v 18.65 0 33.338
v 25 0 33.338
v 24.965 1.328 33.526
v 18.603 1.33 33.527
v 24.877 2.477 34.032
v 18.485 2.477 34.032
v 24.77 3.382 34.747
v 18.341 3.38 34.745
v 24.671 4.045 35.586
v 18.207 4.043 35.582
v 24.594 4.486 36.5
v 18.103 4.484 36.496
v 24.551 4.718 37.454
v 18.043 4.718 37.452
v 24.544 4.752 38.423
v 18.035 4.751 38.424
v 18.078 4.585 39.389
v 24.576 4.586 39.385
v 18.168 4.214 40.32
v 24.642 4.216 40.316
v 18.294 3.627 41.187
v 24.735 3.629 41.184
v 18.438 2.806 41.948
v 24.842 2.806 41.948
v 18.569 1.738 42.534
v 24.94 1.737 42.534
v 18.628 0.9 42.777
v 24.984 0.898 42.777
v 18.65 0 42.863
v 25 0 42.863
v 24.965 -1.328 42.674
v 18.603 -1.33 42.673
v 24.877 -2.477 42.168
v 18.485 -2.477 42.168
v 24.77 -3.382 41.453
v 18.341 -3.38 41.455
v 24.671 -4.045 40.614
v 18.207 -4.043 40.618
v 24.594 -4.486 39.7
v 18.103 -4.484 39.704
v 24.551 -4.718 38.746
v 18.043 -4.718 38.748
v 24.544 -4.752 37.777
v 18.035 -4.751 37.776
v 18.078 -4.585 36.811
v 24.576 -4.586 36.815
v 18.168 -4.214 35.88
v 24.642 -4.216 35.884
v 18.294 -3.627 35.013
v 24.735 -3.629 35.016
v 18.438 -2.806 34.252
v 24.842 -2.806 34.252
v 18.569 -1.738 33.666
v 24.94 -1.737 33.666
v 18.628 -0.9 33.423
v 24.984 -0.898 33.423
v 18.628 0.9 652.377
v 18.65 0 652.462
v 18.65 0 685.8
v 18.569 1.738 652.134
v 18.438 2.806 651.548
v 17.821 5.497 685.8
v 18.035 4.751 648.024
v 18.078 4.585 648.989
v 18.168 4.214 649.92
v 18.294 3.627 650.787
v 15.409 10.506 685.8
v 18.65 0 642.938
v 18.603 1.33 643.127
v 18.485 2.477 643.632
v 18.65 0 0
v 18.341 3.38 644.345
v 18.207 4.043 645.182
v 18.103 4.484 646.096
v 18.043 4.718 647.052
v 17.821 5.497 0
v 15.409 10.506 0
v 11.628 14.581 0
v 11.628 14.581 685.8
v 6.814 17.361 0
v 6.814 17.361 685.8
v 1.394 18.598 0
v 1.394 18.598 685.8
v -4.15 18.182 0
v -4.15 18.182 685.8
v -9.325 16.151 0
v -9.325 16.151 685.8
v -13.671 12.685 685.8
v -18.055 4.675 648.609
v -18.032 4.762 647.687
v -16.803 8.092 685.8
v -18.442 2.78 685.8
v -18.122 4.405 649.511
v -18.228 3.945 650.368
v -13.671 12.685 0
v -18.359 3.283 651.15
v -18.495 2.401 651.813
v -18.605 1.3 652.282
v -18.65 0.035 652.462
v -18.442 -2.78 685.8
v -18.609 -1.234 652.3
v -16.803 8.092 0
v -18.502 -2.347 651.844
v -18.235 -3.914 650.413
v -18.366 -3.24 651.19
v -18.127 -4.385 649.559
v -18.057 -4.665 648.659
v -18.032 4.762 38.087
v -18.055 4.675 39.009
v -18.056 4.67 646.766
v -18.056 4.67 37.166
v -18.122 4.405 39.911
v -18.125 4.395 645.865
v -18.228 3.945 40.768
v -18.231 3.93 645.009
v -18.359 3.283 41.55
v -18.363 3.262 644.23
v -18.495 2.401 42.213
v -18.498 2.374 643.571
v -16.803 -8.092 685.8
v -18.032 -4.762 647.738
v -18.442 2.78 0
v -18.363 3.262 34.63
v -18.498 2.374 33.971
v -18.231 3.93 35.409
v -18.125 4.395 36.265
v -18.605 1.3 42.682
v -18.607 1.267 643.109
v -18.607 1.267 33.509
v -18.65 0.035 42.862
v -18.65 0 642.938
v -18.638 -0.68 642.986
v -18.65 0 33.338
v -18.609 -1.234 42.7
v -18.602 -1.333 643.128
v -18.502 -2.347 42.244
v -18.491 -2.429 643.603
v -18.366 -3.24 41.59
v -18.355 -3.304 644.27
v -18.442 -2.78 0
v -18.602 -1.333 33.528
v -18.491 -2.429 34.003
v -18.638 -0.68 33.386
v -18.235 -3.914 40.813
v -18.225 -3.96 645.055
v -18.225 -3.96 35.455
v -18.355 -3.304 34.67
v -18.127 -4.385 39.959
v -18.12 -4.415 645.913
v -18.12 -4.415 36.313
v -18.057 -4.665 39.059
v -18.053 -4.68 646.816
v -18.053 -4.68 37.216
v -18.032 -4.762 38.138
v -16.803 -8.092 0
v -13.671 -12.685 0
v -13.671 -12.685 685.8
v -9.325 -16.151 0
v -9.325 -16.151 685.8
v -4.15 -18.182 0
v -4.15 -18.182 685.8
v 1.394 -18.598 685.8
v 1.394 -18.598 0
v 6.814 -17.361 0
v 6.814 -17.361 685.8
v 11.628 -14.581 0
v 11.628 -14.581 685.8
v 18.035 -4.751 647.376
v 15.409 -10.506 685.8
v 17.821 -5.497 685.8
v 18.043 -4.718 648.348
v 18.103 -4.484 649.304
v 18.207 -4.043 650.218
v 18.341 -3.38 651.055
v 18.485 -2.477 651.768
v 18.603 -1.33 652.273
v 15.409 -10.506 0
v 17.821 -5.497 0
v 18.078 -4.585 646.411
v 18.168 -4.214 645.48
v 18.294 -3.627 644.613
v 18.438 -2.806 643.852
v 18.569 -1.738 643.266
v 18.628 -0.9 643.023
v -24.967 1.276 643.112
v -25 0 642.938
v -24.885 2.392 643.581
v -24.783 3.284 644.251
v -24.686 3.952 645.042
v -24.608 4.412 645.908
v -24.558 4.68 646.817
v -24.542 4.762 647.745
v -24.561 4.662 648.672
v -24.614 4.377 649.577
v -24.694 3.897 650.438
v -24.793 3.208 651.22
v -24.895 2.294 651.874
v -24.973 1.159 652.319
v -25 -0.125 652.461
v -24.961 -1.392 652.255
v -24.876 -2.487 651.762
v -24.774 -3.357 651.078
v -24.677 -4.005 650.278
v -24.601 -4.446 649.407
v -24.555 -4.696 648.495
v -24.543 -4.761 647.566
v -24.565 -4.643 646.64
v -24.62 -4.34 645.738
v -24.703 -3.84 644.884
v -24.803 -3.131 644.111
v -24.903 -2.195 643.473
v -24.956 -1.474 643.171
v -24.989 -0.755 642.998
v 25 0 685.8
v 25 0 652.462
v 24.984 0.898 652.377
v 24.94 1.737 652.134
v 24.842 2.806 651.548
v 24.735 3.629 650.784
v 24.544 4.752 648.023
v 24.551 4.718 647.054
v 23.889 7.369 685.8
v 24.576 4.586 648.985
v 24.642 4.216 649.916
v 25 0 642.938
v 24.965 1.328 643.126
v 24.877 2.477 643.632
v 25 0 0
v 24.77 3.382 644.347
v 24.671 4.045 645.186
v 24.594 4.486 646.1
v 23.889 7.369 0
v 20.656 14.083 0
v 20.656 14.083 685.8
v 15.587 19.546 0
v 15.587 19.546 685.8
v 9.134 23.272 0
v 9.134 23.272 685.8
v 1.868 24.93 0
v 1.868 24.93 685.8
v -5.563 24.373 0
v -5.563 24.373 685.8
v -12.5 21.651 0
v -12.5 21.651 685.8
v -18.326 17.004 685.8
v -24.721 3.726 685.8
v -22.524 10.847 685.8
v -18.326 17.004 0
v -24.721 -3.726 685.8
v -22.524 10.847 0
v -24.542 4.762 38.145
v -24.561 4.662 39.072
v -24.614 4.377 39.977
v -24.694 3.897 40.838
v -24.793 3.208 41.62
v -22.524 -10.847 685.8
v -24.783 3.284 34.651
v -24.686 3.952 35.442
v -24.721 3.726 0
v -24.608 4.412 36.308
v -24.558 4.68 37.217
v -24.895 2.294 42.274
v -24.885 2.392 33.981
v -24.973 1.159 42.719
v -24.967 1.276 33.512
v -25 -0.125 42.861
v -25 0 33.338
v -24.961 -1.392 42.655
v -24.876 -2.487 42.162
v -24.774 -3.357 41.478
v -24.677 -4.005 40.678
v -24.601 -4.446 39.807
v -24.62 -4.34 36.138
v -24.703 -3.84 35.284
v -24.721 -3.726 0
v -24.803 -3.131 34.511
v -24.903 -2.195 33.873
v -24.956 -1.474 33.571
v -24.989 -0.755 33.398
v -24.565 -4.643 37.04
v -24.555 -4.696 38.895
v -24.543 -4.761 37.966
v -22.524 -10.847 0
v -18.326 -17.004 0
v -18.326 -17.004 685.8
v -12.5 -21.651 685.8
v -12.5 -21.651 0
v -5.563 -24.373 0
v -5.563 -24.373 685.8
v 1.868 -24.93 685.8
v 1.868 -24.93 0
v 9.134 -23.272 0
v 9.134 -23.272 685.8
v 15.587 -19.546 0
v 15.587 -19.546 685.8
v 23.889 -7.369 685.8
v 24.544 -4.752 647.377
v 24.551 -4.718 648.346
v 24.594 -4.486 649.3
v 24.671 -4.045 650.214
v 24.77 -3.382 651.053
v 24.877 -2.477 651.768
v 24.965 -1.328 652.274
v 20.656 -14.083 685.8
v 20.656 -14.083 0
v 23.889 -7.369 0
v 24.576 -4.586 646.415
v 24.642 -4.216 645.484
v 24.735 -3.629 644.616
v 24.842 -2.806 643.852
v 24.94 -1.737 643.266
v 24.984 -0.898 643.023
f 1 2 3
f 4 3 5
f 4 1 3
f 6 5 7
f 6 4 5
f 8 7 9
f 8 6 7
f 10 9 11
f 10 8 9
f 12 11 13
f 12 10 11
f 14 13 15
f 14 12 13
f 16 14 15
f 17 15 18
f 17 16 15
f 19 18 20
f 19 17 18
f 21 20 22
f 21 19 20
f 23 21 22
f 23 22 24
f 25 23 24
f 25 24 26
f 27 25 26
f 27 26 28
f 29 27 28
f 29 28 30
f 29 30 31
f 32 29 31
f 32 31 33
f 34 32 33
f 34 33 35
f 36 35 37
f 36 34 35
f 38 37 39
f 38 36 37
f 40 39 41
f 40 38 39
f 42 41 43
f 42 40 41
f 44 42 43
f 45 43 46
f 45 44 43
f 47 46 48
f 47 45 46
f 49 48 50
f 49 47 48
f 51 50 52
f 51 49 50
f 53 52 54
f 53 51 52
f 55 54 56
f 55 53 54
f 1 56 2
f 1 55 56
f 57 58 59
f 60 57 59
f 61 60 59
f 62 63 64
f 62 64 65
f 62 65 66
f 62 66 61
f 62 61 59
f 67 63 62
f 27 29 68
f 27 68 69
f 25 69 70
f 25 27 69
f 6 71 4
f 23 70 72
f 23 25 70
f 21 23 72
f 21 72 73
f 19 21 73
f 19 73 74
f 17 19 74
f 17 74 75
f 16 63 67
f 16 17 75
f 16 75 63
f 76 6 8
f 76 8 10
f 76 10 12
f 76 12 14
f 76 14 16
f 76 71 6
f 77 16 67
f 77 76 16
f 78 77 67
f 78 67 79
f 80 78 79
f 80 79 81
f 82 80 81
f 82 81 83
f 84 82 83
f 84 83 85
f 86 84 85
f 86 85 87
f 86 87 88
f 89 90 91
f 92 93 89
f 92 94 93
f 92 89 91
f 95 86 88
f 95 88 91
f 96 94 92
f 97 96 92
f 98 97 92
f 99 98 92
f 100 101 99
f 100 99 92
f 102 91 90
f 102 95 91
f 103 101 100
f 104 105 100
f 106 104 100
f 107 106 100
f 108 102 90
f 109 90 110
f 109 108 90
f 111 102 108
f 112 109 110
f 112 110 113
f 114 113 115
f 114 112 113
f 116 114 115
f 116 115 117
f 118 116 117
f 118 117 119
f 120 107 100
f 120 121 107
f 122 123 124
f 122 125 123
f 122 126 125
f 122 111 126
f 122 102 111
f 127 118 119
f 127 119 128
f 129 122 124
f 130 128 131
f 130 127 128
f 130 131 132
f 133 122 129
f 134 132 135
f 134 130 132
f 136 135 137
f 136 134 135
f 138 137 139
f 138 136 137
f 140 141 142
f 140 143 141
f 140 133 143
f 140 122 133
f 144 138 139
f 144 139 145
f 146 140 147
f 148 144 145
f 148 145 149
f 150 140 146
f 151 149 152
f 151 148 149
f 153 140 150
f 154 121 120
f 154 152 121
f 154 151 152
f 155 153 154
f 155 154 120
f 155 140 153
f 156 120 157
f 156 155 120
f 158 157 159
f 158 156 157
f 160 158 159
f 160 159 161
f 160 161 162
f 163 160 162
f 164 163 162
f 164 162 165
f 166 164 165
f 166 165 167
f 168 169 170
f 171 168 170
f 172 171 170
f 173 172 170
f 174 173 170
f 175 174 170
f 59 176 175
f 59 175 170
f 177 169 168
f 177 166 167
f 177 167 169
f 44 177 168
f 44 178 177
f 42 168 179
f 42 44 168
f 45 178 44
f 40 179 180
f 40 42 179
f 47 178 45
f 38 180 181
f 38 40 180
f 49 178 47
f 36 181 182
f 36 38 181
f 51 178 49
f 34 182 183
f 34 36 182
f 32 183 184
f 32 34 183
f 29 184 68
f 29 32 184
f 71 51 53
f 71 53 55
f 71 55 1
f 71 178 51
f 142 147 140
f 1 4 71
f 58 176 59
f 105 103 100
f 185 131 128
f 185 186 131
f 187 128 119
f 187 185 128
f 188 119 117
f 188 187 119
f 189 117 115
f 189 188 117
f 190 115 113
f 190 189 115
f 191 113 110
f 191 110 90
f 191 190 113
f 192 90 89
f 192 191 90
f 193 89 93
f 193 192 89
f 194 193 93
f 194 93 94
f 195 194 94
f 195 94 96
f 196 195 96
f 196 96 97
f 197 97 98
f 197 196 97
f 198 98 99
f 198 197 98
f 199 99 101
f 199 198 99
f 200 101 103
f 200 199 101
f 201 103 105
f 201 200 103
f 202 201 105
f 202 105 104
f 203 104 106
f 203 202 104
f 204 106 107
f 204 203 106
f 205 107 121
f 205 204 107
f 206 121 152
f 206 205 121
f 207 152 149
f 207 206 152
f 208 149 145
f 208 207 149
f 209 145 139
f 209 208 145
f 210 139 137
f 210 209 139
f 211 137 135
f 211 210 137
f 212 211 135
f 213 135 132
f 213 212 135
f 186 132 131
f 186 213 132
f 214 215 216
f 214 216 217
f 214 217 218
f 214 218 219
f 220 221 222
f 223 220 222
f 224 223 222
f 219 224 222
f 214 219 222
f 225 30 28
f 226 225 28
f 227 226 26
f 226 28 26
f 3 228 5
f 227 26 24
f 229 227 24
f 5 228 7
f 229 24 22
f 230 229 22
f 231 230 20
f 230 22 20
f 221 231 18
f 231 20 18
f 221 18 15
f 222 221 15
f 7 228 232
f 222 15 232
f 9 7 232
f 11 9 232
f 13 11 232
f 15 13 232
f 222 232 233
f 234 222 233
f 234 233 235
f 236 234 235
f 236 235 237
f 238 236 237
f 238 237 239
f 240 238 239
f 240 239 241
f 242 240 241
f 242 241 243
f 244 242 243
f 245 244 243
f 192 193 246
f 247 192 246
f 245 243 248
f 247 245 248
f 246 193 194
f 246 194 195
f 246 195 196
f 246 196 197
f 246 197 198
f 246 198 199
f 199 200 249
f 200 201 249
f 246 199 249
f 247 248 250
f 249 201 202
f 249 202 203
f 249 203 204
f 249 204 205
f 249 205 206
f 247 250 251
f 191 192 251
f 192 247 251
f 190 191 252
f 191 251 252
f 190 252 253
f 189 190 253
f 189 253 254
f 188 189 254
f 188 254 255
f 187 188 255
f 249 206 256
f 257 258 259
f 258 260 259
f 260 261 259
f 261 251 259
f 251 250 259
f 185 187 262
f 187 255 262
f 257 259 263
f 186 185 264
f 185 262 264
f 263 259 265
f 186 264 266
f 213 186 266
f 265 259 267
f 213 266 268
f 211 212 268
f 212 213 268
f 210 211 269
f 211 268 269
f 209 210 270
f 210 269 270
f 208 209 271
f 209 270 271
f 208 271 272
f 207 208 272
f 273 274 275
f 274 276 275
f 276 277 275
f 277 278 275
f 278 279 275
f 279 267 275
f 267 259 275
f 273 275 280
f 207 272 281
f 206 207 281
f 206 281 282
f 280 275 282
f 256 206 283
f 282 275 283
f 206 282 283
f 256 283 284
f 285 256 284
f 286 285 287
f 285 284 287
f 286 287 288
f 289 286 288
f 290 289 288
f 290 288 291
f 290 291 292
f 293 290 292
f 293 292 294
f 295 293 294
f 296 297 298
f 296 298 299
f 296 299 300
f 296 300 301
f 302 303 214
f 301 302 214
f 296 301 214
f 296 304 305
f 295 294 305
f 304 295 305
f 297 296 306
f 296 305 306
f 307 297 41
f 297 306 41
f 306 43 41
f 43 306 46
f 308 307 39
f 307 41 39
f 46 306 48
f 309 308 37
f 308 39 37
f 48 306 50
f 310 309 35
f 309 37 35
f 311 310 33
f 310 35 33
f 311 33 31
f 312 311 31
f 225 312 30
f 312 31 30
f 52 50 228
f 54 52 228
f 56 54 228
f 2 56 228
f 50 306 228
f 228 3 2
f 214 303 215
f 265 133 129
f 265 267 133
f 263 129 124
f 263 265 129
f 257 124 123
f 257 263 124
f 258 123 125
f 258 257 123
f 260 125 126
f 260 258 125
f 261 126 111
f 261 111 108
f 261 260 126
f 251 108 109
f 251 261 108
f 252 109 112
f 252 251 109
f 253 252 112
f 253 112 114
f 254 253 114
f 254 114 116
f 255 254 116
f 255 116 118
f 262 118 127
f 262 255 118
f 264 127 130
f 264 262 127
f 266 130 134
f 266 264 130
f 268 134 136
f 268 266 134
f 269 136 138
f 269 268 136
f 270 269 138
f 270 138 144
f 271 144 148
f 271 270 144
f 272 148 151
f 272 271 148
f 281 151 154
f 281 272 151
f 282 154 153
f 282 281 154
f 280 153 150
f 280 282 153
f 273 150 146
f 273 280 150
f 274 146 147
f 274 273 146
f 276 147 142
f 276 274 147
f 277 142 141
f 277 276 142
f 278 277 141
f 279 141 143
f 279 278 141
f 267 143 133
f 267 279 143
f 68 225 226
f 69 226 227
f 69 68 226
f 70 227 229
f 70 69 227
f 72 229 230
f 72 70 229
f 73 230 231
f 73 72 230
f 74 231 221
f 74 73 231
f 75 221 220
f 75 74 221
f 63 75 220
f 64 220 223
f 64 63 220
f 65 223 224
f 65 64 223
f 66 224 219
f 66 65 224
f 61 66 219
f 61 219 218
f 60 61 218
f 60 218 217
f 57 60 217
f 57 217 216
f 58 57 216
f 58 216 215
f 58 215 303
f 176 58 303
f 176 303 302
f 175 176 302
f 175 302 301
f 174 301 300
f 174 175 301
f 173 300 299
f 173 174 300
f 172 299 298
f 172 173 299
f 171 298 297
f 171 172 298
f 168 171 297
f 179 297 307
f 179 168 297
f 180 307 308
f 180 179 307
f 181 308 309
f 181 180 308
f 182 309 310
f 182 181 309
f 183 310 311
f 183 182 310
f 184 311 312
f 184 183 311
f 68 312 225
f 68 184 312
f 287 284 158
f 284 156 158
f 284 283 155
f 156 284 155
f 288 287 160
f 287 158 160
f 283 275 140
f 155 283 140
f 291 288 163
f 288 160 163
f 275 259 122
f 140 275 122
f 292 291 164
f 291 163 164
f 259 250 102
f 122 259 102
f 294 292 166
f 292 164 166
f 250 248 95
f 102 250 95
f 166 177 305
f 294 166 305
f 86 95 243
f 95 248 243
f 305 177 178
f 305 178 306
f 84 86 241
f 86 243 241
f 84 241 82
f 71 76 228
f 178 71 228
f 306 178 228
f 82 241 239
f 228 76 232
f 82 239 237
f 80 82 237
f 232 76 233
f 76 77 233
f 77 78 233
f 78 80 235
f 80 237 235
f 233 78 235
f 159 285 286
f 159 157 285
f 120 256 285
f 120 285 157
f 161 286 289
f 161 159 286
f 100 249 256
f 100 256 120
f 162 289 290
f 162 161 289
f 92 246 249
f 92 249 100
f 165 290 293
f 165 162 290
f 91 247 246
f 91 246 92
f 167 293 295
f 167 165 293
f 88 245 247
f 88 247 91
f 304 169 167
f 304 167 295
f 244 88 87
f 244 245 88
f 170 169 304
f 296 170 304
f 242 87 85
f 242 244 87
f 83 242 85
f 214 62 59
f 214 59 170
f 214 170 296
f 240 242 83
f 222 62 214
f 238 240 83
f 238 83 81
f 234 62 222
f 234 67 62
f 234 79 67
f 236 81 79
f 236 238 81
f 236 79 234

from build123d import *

# Parameters (mm, degrees)
SKETCH1_R               = 25
SKETCH1_R_2             = 18.65
BOSS_EXTRUDE1_DEPTH     = 685.8
CUT_EXTRUDE1_DEPTH      = 687.710739686
CUT_EXTRUDE1_DEPTH_BACK = 687.710739686
SKETCH2_R               = 4.7625


with BuildPart() as part:
    # Sketch1 → Boss-Extrude1 (new body)
    with BuildSketch(Plane.XY):
        Circle(SKETCH1_R)
        Circle(SKETCH1_R_2, mode=Mode.SUBTRACT)
    extrude(amount=BOSS_EXTRUDE1_DEPTH)

    # Sketch2 → Cut-Extrude1 (cut, two sides: drawn at the far end of the back side and taken through both)
    with BuildSketch(Plane(origin=(0, 0, 0), x_dir=(0, 0, -1), z_dir=(1, 0, 0)).offset(-CUT_EXTRUDE1_DEPTH_BACK)):
        with Locations((-647.7, 0)):
            Circle(SKETCH2_R)
        with Locations((-38.1, 0)):
            Circle(SKETCH2_R)
    extrude(amount=CUT_EXTRUDE1_DEPTH + CUT_EXTRUDE1_DEPTH_BACK, mode=Mode.SUBTRACT)


solid = part.part
